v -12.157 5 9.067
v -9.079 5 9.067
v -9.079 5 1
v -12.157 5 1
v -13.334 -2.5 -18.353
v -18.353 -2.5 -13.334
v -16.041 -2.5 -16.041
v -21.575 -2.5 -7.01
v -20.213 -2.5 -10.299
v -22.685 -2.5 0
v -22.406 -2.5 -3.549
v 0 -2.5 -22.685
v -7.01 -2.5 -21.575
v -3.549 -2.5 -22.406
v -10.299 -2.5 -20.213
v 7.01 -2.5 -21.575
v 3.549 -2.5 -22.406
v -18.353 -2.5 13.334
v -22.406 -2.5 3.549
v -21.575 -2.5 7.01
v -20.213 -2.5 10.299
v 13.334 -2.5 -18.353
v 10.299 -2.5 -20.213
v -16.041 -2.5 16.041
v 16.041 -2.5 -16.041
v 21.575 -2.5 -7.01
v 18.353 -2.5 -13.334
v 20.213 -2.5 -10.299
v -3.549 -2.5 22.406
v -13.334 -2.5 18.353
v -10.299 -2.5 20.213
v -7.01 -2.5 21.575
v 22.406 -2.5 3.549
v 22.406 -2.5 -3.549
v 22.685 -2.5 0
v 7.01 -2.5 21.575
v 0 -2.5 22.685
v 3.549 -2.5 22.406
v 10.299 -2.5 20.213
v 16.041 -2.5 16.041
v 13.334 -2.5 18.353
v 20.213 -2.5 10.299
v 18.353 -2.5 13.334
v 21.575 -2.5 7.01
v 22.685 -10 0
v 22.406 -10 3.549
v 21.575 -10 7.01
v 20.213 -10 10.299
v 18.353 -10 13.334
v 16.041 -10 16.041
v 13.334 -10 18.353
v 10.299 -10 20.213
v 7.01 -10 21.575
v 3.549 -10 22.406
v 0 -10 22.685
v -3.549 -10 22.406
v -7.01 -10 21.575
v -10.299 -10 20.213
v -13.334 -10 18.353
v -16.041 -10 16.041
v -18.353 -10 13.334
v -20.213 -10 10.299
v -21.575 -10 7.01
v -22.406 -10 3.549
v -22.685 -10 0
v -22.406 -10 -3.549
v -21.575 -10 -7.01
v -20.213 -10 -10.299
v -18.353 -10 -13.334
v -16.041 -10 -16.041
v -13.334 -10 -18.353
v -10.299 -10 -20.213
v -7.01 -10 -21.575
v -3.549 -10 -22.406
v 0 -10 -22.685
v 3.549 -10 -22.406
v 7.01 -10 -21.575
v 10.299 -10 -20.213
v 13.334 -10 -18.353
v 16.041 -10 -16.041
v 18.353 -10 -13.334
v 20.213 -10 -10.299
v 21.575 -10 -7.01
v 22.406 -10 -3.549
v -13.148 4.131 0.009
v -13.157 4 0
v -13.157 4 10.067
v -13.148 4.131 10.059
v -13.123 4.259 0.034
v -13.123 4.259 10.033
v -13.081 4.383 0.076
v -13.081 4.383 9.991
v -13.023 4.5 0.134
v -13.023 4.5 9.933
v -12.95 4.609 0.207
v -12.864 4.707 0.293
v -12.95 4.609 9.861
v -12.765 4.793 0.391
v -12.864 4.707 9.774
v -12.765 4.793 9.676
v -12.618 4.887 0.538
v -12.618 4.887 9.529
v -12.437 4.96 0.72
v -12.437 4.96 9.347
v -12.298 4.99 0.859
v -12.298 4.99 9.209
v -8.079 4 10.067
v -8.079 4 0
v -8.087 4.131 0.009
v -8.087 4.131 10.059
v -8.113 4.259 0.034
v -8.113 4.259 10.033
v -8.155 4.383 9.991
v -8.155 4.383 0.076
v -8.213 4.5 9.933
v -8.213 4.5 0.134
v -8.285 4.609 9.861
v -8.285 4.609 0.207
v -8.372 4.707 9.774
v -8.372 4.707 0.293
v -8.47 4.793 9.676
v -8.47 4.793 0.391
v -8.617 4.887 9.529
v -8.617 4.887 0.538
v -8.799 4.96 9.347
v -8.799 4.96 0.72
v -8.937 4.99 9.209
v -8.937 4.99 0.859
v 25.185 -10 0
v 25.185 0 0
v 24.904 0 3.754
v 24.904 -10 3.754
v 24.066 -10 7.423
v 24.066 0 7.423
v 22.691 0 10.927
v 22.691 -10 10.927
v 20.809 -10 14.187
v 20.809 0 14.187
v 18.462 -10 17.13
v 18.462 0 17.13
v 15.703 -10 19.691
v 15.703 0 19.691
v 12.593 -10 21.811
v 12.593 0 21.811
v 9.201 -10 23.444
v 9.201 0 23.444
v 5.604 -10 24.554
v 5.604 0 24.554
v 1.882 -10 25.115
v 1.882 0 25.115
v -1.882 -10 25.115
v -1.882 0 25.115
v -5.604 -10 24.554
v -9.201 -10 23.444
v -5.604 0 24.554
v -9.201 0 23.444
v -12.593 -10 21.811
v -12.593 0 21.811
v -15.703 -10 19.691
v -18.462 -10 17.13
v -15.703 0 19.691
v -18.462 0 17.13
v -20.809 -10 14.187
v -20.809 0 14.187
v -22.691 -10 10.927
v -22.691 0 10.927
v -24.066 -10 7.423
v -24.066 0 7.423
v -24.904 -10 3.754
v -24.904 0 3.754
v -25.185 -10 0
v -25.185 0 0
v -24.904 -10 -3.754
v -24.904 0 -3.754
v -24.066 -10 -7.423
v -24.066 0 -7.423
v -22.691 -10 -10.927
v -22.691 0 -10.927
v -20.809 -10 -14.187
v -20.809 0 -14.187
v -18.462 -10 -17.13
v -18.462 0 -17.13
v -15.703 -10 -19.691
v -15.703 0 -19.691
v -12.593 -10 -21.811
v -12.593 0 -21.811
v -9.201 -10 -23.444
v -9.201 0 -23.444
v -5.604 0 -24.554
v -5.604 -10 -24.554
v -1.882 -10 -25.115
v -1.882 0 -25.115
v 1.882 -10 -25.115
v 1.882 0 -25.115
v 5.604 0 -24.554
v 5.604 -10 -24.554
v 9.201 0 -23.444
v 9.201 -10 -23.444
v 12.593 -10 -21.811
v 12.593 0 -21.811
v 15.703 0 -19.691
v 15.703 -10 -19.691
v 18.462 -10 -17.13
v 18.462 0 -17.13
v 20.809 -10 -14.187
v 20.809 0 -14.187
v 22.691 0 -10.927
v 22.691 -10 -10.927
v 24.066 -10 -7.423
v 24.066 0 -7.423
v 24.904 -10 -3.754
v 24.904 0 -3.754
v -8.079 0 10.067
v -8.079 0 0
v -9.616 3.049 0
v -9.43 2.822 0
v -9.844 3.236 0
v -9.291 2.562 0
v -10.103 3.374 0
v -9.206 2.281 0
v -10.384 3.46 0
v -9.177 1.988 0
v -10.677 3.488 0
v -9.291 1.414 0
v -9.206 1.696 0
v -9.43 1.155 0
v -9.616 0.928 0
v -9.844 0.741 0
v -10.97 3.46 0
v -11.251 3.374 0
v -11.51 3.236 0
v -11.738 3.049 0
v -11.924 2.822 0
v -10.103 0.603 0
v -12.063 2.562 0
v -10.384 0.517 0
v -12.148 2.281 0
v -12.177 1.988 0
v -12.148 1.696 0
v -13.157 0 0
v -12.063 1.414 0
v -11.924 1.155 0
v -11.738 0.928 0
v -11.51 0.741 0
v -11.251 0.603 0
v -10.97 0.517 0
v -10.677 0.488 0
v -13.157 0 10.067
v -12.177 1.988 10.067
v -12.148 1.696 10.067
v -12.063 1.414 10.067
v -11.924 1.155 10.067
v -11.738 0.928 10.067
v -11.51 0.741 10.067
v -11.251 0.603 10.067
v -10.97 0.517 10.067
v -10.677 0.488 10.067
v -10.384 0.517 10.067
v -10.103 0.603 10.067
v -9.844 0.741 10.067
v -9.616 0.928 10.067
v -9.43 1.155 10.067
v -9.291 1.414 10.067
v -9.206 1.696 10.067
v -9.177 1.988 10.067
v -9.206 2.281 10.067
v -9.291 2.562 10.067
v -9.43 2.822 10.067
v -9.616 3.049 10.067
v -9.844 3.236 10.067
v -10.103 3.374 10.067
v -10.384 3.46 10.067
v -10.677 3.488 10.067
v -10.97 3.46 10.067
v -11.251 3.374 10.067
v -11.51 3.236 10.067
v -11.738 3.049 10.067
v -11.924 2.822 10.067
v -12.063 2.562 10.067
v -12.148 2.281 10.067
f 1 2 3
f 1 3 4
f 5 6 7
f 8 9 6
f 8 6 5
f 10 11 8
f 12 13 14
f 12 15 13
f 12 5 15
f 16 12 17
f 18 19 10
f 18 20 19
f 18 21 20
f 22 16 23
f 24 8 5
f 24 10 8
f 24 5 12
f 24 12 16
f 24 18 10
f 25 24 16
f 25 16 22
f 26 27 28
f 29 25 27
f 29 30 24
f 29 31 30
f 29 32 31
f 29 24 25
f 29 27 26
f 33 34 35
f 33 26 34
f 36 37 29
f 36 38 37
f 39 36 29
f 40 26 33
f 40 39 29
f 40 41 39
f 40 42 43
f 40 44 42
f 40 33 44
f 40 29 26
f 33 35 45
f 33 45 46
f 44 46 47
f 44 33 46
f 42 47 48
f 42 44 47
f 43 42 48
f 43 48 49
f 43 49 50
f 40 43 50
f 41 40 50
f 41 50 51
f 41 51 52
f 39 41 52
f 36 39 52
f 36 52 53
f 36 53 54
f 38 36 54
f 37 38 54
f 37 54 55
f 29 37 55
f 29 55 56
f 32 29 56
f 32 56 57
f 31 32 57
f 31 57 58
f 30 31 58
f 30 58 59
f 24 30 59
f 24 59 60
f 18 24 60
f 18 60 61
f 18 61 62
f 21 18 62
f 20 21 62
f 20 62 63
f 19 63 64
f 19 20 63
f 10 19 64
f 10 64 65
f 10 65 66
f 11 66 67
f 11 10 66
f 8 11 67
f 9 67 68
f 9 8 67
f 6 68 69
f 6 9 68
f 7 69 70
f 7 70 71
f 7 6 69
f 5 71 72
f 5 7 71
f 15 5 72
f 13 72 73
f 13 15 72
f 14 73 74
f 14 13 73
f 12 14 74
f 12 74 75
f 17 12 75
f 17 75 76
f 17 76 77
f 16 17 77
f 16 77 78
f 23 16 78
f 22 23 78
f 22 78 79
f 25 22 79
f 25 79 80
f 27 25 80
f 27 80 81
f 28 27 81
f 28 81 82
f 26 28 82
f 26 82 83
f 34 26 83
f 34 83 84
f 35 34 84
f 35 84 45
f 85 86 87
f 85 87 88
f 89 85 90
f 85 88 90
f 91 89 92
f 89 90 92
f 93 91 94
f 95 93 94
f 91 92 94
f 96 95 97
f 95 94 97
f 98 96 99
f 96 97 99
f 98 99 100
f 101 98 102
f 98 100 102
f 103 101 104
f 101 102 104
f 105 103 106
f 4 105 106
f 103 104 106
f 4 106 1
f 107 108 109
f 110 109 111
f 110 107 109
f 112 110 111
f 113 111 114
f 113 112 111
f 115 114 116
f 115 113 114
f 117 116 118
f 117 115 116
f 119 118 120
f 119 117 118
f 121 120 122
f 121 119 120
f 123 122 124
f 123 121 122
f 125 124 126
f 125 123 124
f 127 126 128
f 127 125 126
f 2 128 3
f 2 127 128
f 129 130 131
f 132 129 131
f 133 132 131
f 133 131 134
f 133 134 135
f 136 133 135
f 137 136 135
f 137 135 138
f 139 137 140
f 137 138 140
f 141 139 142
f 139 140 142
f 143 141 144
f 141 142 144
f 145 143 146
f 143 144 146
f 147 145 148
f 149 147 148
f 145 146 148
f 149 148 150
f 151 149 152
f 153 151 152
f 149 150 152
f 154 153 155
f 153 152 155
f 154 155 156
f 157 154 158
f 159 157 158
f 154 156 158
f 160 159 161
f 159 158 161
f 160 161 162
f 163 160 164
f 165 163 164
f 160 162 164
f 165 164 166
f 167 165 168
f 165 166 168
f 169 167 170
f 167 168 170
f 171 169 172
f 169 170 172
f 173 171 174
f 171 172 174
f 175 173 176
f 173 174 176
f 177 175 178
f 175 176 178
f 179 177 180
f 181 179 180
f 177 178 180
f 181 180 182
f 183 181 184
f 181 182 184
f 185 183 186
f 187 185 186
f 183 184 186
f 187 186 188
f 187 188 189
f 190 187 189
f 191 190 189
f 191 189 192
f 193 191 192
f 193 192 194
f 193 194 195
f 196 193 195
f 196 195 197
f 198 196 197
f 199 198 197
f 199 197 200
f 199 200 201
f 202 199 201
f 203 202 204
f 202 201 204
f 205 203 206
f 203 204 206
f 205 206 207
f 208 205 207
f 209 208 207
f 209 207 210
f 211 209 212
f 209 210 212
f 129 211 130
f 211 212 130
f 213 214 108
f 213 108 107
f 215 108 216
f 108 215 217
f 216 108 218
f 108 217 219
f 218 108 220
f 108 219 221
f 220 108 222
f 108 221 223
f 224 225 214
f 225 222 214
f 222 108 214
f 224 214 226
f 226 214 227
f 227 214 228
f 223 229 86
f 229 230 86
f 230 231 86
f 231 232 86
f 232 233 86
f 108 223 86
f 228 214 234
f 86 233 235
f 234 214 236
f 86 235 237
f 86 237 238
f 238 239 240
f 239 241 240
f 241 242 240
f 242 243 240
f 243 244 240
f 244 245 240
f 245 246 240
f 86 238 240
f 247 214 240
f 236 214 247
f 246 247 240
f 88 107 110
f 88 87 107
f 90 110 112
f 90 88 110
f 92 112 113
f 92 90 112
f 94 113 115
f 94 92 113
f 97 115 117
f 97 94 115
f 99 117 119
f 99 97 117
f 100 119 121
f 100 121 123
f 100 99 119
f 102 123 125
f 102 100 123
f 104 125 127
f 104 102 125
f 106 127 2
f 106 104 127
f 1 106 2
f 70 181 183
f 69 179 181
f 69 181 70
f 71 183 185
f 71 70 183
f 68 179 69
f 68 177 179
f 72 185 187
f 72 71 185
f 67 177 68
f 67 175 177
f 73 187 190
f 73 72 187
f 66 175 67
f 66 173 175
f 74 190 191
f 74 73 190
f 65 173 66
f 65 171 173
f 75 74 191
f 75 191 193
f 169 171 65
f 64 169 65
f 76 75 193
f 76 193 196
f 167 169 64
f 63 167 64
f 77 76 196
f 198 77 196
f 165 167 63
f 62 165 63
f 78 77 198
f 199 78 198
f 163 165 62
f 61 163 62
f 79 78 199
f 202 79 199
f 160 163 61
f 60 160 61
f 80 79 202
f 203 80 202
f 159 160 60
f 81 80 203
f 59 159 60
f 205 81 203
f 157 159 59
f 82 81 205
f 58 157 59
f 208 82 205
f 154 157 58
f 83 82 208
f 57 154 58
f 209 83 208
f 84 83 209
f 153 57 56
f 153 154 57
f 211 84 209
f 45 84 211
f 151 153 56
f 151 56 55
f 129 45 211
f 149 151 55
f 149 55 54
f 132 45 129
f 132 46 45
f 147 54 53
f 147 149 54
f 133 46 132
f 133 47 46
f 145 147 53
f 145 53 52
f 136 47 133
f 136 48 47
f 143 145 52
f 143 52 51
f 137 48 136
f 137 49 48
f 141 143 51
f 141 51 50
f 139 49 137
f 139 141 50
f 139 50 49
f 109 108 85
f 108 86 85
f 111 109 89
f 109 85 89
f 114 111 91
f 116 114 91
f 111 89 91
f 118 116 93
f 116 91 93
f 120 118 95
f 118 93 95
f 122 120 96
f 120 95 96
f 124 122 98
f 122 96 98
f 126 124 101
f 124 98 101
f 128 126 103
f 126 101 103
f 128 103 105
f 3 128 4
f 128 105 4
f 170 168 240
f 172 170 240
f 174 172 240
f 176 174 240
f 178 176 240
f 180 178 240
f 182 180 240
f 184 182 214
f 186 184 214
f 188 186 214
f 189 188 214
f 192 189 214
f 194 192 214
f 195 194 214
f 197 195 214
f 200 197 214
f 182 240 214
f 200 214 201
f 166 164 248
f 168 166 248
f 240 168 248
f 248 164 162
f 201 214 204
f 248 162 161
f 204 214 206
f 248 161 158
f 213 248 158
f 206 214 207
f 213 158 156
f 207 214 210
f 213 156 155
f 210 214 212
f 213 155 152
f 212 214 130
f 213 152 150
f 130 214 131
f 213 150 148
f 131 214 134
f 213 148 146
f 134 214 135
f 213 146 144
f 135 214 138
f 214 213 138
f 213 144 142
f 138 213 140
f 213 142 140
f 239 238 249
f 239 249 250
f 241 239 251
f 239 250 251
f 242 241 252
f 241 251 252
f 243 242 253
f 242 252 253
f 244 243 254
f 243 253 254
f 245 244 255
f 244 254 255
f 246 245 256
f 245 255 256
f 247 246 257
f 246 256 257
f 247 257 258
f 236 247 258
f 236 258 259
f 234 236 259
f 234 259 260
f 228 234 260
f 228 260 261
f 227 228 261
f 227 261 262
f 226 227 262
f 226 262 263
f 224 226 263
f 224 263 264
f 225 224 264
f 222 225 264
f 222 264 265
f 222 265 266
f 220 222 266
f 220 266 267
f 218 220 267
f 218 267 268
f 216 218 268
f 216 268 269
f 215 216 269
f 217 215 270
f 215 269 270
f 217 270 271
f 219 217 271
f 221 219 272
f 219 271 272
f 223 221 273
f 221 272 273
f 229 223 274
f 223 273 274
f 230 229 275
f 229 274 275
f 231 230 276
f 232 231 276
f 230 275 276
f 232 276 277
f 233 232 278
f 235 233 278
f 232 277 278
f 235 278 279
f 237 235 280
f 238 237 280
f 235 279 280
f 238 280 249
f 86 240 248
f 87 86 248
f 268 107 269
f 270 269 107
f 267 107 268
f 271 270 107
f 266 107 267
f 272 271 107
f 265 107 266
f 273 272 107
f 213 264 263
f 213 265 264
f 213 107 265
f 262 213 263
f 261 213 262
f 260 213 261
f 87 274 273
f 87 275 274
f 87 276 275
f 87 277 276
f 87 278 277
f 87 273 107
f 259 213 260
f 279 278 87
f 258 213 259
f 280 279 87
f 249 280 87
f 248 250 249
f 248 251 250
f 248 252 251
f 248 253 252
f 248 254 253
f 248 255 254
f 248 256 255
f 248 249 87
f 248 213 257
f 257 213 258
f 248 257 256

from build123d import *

# Parameters (mm, degrees)
F0_R     = 25.1852873168
F1_DEPTH = 10
F2_T     = -2.5
F3_W     = 5.0779422745
F3_H     = 10.067243129
F4_DEPTH = 5
F5_R     = 1
F7_D     = 3


with BuildPart() as f1:
    # F0 (on Front) → F1 (new body)
    with BuildSketch(Plane.XZ):
        Circle(F0_R)
    extrude(amount=F1_DEPTH)

    # F2
    f2_openings = [f1.faces().sort_by_distance(p)[0] for p in [
        (0, -10, 0),
    ]]
    offset(amount=F2_T, openings=f2_openings)

    # F3 (on face) → F4 (join)
    with BuildSketch(Plane(origin=(0, 0, 0), x_dir=(-1, 0, 0), z_dir=(0, 1, 0))):
        with Locations((10.6177399866, 5.0336215645)):
            Rectangle(F3_W, F3_H)
    extrude(amount=F4_DEPTH)

    # F5
    f5_edges = [f1.edges().sort_by_distance(p)[0] for p in [
        (-8.078769, 5, 5.033622),
        (-10.61774, 5, 0),
        (-13.156711, 5, 5.033622),
        (-10.61774, 5, 10.067243),
    ]]
    fillet(f5_edges, radius=F5_R)

    # F7 (through all)
    with Locations(Plane(origin=(0, 0, 0), x_dir=(1, 0, 0), z_dir=(0, 0, -1))):
        with Locations((-10.6769287959, -1.9884661306)):
            Hole(F7_D / 2)


solid = f1.part
